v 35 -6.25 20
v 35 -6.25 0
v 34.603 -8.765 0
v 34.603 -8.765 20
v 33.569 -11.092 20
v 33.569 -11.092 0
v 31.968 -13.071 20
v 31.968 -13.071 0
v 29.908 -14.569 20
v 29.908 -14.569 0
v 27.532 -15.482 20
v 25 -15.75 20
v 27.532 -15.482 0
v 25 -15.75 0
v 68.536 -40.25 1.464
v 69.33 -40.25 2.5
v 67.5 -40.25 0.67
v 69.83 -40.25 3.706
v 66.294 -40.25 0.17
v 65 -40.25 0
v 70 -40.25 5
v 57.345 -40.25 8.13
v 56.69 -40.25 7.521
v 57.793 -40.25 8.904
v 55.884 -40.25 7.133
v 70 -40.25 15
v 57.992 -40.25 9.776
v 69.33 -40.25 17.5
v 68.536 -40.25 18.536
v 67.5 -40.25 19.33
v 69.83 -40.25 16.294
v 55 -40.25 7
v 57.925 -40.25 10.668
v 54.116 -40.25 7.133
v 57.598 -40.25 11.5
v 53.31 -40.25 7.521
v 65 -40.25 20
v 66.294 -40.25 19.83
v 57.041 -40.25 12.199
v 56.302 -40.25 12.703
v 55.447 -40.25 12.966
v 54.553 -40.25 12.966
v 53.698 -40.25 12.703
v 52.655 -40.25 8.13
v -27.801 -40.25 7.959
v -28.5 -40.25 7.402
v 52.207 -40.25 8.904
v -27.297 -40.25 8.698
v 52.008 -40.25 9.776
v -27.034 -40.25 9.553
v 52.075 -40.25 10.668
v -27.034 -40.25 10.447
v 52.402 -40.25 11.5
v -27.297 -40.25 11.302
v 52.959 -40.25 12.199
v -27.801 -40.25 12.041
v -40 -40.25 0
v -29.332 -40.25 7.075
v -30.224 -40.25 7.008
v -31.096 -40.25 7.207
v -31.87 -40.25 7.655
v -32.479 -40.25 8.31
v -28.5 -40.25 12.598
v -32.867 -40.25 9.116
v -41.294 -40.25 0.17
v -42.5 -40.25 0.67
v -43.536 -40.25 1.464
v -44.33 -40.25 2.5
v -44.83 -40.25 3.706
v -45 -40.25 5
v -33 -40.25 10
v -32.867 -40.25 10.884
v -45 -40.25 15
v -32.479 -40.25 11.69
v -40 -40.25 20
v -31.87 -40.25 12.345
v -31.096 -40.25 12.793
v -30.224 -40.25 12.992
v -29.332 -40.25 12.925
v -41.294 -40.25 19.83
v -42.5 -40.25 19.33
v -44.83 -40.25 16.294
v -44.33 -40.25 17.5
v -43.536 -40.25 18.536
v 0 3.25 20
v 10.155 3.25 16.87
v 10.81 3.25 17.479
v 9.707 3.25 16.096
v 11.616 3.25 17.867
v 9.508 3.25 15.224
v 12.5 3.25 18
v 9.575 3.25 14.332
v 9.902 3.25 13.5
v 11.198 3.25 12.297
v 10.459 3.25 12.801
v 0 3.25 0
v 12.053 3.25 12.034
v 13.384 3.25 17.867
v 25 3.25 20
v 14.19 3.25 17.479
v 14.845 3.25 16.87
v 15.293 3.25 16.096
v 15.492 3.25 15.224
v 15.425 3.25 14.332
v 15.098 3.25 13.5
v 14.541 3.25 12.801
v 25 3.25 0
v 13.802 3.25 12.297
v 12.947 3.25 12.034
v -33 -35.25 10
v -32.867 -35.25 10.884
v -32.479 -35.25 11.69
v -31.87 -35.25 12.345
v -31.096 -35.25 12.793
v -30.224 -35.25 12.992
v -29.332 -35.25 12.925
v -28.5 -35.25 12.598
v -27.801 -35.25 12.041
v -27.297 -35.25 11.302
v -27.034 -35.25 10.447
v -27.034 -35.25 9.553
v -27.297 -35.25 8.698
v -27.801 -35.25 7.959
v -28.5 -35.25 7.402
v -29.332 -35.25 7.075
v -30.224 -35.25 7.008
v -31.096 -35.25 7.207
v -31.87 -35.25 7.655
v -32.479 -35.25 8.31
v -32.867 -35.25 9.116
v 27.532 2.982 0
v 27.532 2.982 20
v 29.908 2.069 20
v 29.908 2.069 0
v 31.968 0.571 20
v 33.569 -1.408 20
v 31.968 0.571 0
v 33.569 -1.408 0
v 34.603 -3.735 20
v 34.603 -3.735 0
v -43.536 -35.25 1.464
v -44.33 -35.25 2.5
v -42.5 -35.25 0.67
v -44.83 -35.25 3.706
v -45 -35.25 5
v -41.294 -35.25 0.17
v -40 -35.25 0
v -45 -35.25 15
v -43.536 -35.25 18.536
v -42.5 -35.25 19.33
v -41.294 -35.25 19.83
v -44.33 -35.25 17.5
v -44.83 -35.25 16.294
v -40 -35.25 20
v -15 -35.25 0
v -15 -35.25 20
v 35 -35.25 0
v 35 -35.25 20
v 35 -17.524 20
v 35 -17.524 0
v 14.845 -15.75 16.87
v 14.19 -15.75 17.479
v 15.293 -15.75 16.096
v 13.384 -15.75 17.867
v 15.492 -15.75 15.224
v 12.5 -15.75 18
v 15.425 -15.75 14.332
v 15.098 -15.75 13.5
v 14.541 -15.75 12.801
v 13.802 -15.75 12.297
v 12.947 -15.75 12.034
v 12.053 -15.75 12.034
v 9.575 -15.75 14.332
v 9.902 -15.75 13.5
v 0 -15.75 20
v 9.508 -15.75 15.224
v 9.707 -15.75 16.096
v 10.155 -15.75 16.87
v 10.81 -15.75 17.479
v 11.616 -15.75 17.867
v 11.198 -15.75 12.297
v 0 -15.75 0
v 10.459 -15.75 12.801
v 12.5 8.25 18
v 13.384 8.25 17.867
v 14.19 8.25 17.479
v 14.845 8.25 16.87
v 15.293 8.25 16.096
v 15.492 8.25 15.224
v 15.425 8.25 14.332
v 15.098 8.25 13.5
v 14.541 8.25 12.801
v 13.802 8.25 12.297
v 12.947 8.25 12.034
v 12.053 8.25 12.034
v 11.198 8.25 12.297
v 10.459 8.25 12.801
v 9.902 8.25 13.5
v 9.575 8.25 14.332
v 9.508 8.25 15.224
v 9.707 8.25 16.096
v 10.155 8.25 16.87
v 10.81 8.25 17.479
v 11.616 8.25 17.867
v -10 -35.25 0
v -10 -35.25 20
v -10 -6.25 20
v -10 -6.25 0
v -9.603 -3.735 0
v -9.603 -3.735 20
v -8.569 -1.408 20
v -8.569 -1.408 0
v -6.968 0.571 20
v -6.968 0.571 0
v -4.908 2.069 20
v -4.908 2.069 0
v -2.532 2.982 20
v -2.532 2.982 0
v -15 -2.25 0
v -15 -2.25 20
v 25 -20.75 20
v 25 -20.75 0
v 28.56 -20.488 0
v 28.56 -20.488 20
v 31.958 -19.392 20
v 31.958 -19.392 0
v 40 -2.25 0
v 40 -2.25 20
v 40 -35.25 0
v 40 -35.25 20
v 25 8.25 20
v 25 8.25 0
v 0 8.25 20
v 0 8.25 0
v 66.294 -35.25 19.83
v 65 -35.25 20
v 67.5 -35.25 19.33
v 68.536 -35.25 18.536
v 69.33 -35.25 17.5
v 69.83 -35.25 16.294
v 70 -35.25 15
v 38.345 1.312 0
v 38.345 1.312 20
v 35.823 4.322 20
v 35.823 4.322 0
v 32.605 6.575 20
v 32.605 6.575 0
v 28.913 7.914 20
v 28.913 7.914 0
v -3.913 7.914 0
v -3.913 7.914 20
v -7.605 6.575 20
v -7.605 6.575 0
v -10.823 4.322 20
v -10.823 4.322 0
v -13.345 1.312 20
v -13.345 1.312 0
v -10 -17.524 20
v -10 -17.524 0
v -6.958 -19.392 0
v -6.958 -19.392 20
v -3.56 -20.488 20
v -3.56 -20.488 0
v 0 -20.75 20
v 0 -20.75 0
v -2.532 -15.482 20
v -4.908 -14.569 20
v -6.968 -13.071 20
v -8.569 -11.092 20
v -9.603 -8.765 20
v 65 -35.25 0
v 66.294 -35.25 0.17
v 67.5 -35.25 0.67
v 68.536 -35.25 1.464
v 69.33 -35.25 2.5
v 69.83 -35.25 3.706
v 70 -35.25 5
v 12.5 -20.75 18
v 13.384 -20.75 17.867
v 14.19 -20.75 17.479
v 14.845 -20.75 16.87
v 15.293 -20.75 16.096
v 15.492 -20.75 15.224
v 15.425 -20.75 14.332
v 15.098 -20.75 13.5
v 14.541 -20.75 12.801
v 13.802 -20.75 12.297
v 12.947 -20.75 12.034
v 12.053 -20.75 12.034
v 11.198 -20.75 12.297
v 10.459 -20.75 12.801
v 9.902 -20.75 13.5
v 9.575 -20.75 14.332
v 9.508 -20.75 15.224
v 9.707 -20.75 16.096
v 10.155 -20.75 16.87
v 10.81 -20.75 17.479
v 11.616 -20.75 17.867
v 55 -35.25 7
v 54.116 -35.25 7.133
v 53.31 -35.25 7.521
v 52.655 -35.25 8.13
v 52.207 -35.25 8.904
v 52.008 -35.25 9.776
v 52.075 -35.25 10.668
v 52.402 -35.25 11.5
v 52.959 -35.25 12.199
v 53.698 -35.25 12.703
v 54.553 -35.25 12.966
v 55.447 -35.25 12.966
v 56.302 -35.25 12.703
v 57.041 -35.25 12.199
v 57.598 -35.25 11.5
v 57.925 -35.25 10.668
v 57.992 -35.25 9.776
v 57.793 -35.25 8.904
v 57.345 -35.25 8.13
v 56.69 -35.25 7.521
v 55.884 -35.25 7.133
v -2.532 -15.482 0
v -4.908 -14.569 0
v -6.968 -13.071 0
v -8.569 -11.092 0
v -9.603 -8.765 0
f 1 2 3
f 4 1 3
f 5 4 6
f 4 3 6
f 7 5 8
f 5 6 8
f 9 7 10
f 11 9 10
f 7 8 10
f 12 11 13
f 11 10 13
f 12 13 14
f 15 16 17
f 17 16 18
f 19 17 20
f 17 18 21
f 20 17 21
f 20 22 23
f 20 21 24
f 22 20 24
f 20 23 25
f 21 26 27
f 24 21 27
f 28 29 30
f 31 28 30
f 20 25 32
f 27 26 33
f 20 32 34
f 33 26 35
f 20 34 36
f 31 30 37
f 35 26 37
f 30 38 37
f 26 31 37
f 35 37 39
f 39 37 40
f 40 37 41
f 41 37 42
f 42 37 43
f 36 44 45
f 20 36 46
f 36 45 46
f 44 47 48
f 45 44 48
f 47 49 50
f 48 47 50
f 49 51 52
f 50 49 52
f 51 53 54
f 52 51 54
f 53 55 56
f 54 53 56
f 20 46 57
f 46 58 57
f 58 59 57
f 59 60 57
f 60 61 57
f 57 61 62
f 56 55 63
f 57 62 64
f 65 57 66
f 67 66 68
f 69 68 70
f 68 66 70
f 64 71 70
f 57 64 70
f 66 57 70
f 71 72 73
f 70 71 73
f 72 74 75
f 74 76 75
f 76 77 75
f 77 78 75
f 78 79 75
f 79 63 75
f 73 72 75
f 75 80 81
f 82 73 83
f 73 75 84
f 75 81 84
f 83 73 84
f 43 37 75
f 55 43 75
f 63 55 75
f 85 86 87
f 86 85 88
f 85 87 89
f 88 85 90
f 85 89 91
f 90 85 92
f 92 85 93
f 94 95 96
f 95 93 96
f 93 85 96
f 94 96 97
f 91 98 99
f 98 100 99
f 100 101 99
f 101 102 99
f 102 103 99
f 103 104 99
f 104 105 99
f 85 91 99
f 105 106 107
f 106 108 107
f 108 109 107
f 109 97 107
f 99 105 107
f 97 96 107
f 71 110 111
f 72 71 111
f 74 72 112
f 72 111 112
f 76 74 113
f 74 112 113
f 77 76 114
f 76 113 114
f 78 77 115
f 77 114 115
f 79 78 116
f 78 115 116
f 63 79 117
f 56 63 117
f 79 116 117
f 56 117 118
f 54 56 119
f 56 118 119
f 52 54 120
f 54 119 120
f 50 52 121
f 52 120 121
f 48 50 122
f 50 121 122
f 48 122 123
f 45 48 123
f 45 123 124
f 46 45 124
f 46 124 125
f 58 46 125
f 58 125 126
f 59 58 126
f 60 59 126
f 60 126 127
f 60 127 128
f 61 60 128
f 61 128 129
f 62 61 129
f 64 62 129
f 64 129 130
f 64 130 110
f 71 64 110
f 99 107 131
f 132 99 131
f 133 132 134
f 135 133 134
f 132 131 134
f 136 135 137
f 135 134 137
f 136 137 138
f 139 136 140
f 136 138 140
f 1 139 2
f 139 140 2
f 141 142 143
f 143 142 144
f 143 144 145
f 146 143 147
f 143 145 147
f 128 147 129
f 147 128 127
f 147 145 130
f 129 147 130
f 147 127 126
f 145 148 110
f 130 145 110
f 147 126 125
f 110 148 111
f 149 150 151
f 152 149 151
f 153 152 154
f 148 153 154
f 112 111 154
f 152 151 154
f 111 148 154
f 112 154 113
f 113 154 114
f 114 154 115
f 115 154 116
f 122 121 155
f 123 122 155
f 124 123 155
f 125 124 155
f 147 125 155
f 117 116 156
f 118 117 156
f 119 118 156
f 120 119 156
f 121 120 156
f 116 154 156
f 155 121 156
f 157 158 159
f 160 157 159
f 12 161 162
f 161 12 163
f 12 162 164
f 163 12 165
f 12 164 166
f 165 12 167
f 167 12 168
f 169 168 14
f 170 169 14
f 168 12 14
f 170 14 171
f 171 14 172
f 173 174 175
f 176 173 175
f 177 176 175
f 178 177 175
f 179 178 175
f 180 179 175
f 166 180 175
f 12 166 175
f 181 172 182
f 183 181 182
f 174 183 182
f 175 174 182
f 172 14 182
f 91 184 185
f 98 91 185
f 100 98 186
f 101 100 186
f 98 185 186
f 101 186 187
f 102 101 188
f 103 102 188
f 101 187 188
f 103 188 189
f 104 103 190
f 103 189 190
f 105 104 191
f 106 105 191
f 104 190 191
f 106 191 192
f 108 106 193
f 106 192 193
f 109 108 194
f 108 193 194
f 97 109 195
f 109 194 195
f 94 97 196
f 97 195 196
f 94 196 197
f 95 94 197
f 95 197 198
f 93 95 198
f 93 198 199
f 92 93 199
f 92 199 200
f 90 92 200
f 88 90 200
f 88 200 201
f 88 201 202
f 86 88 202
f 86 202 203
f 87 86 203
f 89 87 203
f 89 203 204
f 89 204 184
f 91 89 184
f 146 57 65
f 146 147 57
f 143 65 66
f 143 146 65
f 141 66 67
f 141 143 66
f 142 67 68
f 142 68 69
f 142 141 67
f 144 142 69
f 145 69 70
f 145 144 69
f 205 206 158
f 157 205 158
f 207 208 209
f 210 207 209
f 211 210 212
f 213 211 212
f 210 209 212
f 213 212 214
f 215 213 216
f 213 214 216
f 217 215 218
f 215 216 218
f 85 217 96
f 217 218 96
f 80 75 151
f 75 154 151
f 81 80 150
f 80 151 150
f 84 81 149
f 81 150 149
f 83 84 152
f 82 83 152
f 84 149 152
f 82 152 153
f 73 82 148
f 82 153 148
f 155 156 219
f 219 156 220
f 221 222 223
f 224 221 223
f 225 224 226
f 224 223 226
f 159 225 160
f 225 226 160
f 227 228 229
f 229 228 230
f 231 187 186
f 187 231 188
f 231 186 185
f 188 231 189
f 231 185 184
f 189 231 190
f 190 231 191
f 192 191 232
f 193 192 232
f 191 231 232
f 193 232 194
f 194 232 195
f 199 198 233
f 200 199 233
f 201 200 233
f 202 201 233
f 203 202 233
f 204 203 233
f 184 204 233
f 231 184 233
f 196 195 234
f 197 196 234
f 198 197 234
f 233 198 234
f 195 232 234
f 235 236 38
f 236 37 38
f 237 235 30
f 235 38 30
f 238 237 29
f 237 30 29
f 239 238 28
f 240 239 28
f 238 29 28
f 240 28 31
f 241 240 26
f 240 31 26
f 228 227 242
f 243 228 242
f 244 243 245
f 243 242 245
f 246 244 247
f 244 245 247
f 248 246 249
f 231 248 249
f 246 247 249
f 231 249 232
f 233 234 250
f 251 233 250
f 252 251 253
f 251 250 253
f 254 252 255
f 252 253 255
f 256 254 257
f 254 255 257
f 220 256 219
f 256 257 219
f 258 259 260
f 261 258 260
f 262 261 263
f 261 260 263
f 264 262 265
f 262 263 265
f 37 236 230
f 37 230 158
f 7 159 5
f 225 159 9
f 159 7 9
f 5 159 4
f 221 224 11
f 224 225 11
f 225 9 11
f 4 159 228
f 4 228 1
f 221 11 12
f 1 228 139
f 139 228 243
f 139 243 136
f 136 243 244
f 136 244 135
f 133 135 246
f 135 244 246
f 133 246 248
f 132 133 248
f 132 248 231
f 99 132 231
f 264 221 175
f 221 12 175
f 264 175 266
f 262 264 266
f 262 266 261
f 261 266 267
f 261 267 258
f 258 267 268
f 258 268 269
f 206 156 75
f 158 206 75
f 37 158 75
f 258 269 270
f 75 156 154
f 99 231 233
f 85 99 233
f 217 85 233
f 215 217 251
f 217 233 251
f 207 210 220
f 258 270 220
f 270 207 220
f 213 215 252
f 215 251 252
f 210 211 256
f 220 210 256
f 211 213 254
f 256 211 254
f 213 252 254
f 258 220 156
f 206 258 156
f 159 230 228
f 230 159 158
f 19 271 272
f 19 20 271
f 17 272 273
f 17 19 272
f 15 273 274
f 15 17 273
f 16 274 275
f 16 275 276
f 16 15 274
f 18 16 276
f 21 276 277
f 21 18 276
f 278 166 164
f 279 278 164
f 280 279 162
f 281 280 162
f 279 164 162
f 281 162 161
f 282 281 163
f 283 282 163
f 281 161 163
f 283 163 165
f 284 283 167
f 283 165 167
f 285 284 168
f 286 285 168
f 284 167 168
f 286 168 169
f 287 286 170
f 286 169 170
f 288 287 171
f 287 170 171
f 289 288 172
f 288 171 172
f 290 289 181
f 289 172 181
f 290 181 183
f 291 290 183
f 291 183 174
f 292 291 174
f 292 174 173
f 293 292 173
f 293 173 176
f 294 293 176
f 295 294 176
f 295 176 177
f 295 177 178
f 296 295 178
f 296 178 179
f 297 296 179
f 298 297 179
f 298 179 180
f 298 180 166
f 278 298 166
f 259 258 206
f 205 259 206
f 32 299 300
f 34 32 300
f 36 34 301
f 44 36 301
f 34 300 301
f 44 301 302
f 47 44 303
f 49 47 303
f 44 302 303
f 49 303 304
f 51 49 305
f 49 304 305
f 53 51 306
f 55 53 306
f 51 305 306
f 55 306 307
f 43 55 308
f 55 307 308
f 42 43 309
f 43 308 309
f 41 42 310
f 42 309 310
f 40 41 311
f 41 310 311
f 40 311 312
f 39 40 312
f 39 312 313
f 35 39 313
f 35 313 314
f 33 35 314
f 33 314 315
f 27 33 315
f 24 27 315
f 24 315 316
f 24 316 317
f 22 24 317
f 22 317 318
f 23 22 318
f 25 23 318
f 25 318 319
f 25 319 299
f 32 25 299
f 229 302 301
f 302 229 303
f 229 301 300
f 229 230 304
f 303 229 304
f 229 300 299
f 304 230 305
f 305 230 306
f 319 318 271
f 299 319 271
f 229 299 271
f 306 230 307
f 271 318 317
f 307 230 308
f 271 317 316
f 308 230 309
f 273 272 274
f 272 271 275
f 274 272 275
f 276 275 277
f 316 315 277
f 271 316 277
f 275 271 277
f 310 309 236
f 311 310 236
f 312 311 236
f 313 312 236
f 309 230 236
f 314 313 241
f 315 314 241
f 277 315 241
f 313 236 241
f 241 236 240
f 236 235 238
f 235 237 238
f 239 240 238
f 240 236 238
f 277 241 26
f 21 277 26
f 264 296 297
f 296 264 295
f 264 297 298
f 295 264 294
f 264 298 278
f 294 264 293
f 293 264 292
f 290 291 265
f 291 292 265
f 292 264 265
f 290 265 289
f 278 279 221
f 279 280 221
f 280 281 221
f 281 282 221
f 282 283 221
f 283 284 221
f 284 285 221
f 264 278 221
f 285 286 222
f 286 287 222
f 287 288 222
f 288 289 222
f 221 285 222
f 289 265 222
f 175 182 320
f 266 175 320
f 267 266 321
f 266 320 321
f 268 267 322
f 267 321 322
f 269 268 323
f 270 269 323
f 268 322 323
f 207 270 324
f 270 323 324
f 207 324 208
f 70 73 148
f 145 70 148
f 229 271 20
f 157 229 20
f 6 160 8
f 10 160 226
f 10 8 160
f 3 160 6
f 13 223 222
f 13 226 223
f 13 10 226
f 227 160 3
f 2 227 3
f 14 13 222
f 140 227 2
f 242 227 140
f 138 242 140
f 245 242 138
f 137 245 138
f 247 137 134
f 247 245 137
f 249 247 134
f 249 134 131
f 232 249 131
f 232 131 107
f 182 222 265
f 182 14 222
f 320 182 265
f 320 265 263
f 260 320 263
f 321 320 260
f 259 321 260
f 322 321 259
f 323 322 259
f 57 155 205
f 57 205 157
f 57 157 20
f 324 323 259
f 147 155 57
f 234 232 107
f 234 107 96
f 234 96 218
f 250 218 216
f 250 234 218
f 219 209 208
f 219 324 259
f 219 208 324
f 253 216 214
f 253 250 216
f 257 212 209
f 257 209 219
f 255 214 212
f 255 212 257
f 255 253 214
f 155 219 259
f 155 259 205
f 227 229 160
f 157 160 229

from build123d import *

# Parameters (mm, degrees)
SALIENTE_EXTRUIR1_DEPTH = 20
SALIENTE_EXTRUIR2_DEPTH = 20
CORTAR_EXTRUIR2_REACH   = 89.477
CROQUIS4_R              = 3
REDONDEO1_R             = 5
CORTAR_EXTRUIR3_REACH   = 86.815
CROQUIS5_R              = 3


with BuildPart() as part:
    # Croquis1 → Saliente-Extruir1 (new body)
    with BuildSketch(Plane.XY):
        with BuildLine():
            Line((0, -20.75), (25, -20.75))
            ThreePointArc((25, -20.75), (34.287921033, -18.054172905), (40, -10.25))
            Line((40, -10.25), (40, -6.25))
            Line((40, -6.25), (40, -2.25))
            ThreePointArc((40, -2.25), (34.287921033, 5.554172905), (25, 8.25))
            Line((25, 8.25), (0, 8.25))
            ThreePointArc((0, 8.25), (-9.287921033, 5.554172905), (-15, -2.25))
            Line((-15, -2.25), (-15, -6.25))
            Line((-15, -6.25), (-15, -10.25))
            ThreePointArc((-15, -10.25), (-9.287921033, -18.054172905), (0, -20.75))
        make_face()
        with BuildLine():
            Line((0, 3.25), (25, 3.25))
            ThreePointArc((25, 3.25), (31.967514421, 0.571067812), (35, -6.25))
            ThreePointArc((35, -6.25), (31.967514421, -13.071067812), (25, -15.75))
            Line((25, -15.75), (0, -15.75))
            ThreePointArc((0, -15.75), (-6.967514421, -13.071067812), (-10, -6.25))
            ThreePointArc((-10, -6.25), (-6.967514421, 0.571067812), (0, 3.25))
        make_face(mode=Mode.SUBTRACT)
    extrude(amount=SALIENTE_EXTRUIR1_DEPTH)

    # Croquis3 → Saliente-Extruir2 (add, through all)
    with BuildSketch(Plane.XY.offset(20)):
        with BuildLine():
            Line((40, -10.25), (40, -35.25))
            Line((40, -35.25), (70, -35.25))
            Line((70, -35.25), (70, -40.25))
            Line((70, -40.25), (40, -40.25))
            Line((40, -40.25), (-15, -40.25))
            Line((-15, -40.25), (-45, -40.25))
            Line((-45, -40.25), (-45, -35.25))
            Line((-45, -35.25), (-15, -35.25))
            Line((-15, -35.25), (-15, -10.25))
            ThreePointArc((-15, -10.25), (-13.047109047, -14.26290739), (-10, -17.523633574))
            Line((-10, -17.523633574), (-10, -35.25))
            Line((-10, -35.25), (35, -35.25))
            Line((35, -35.25), (35, -17.523633574))
            ThreePointArc((35, -17.523633574), (38.047109047, -14.26290739), (40, -10.25))
        make_face()
    extrude(amount=-SALIENTE_EXTRUIR2_DEPTH)

    # Cortar-Extruir2: up to this face of the body (flat: up to its plane)
    cortar_extruir2_end = Plane(part.part.faces().sort_by_distance((12.5, -20.75, 10))[0])
    # Croquis4 → Cortar-Extruir2 (cut, up to the picked face)
    with BuildSketch(Plane(origin=(0, 8.25, 0), x_dir=(1, 0, 0), z_dir=(0, 1, 0)), mode=Mode.PRIVATE) as cortar_extruir2_sk1:
        with Locations(Location((12.5, -15, 0), (0, 0, 270))):
            Circle(CROQUIS4_R)
    cortar_extruir2_tool1 = split(extrude(cortar_extruir2_sk1.sketch, amount=-CORTAR_EXTRUIR2_REACH, mode=Mode.PRIVATE), bisect_by=cortar_extruir2_end, keep=Keep.BOTH, mode=Mode.PRIVATE)
    add(cortar_extruir2_tool1.solids().sort_by(Axis((12.5, 8.25, 15), (0, -1, 0)))[0], mode=Mode.SUBTRACT)

    # Redondeo1
    redondeo1_edges = [part.edges().sort_by_distance(p)[0] for p in [
        (70, -37.75, 0),
        (-45, -37.75, 0),
        (-45, -37.75, 20),
        (70, -37.75, 20),
    ]]
    fillet(redondeo1_edges, radius=REDONDEO1_R)

    # Croquis5 → Cortar-Extruir3 (cut, up to next)
    with BuildSketch(Plane(origin=(0, -35.25, 0), x_dir=(1, 0, 0), z_dir=(0, 1, 0)), mode=Mode.PRIVATE) as cortar_extruir3_sk1:
        with Locations(Location((-30, -10, 0), (0, 0, 180))):
            Circle(CROQUIS5_R)
    cortar_extruir3_tool1 = extrude(cortar_extruir3_sk1.sketch, amount=-CORTAR_EXTRUIR3_REACH, mode=Mode.PRIVATE) & part.part
    # Croquis5 → Cortar-Extruir3 (cut, up to next)
    with BuildSketch(Plane(origin=(0, -35.25, 0), x_dir=(1, 0, 0), z_dir=(0, 1, 0)), mode=Mode.PRIVATE) as cortar_extruir3_sk2:
        with Locations(Location((55, -10, 0), (0, 0, 90))):
            Circle(CROQUIS5_R)
    cortar_extruir3_tool2 = extrude(cortar_extruir3_sk2.sketch, amount=-CORTAR_EXTRUIR3_REACH, mode=Mode.PRIVATE) & part.part
    add(cortar_extruir3_tool1.solids().sort_by_distance((-30, -35.25, 10))[0], mode=Mode.SUBTRACT)
    add(cortar_extruir3_tool2.solids().sort_by_distance((55, -35.25, 10))[0], mode=Mode.SUBTRACT)


solid = part.part
